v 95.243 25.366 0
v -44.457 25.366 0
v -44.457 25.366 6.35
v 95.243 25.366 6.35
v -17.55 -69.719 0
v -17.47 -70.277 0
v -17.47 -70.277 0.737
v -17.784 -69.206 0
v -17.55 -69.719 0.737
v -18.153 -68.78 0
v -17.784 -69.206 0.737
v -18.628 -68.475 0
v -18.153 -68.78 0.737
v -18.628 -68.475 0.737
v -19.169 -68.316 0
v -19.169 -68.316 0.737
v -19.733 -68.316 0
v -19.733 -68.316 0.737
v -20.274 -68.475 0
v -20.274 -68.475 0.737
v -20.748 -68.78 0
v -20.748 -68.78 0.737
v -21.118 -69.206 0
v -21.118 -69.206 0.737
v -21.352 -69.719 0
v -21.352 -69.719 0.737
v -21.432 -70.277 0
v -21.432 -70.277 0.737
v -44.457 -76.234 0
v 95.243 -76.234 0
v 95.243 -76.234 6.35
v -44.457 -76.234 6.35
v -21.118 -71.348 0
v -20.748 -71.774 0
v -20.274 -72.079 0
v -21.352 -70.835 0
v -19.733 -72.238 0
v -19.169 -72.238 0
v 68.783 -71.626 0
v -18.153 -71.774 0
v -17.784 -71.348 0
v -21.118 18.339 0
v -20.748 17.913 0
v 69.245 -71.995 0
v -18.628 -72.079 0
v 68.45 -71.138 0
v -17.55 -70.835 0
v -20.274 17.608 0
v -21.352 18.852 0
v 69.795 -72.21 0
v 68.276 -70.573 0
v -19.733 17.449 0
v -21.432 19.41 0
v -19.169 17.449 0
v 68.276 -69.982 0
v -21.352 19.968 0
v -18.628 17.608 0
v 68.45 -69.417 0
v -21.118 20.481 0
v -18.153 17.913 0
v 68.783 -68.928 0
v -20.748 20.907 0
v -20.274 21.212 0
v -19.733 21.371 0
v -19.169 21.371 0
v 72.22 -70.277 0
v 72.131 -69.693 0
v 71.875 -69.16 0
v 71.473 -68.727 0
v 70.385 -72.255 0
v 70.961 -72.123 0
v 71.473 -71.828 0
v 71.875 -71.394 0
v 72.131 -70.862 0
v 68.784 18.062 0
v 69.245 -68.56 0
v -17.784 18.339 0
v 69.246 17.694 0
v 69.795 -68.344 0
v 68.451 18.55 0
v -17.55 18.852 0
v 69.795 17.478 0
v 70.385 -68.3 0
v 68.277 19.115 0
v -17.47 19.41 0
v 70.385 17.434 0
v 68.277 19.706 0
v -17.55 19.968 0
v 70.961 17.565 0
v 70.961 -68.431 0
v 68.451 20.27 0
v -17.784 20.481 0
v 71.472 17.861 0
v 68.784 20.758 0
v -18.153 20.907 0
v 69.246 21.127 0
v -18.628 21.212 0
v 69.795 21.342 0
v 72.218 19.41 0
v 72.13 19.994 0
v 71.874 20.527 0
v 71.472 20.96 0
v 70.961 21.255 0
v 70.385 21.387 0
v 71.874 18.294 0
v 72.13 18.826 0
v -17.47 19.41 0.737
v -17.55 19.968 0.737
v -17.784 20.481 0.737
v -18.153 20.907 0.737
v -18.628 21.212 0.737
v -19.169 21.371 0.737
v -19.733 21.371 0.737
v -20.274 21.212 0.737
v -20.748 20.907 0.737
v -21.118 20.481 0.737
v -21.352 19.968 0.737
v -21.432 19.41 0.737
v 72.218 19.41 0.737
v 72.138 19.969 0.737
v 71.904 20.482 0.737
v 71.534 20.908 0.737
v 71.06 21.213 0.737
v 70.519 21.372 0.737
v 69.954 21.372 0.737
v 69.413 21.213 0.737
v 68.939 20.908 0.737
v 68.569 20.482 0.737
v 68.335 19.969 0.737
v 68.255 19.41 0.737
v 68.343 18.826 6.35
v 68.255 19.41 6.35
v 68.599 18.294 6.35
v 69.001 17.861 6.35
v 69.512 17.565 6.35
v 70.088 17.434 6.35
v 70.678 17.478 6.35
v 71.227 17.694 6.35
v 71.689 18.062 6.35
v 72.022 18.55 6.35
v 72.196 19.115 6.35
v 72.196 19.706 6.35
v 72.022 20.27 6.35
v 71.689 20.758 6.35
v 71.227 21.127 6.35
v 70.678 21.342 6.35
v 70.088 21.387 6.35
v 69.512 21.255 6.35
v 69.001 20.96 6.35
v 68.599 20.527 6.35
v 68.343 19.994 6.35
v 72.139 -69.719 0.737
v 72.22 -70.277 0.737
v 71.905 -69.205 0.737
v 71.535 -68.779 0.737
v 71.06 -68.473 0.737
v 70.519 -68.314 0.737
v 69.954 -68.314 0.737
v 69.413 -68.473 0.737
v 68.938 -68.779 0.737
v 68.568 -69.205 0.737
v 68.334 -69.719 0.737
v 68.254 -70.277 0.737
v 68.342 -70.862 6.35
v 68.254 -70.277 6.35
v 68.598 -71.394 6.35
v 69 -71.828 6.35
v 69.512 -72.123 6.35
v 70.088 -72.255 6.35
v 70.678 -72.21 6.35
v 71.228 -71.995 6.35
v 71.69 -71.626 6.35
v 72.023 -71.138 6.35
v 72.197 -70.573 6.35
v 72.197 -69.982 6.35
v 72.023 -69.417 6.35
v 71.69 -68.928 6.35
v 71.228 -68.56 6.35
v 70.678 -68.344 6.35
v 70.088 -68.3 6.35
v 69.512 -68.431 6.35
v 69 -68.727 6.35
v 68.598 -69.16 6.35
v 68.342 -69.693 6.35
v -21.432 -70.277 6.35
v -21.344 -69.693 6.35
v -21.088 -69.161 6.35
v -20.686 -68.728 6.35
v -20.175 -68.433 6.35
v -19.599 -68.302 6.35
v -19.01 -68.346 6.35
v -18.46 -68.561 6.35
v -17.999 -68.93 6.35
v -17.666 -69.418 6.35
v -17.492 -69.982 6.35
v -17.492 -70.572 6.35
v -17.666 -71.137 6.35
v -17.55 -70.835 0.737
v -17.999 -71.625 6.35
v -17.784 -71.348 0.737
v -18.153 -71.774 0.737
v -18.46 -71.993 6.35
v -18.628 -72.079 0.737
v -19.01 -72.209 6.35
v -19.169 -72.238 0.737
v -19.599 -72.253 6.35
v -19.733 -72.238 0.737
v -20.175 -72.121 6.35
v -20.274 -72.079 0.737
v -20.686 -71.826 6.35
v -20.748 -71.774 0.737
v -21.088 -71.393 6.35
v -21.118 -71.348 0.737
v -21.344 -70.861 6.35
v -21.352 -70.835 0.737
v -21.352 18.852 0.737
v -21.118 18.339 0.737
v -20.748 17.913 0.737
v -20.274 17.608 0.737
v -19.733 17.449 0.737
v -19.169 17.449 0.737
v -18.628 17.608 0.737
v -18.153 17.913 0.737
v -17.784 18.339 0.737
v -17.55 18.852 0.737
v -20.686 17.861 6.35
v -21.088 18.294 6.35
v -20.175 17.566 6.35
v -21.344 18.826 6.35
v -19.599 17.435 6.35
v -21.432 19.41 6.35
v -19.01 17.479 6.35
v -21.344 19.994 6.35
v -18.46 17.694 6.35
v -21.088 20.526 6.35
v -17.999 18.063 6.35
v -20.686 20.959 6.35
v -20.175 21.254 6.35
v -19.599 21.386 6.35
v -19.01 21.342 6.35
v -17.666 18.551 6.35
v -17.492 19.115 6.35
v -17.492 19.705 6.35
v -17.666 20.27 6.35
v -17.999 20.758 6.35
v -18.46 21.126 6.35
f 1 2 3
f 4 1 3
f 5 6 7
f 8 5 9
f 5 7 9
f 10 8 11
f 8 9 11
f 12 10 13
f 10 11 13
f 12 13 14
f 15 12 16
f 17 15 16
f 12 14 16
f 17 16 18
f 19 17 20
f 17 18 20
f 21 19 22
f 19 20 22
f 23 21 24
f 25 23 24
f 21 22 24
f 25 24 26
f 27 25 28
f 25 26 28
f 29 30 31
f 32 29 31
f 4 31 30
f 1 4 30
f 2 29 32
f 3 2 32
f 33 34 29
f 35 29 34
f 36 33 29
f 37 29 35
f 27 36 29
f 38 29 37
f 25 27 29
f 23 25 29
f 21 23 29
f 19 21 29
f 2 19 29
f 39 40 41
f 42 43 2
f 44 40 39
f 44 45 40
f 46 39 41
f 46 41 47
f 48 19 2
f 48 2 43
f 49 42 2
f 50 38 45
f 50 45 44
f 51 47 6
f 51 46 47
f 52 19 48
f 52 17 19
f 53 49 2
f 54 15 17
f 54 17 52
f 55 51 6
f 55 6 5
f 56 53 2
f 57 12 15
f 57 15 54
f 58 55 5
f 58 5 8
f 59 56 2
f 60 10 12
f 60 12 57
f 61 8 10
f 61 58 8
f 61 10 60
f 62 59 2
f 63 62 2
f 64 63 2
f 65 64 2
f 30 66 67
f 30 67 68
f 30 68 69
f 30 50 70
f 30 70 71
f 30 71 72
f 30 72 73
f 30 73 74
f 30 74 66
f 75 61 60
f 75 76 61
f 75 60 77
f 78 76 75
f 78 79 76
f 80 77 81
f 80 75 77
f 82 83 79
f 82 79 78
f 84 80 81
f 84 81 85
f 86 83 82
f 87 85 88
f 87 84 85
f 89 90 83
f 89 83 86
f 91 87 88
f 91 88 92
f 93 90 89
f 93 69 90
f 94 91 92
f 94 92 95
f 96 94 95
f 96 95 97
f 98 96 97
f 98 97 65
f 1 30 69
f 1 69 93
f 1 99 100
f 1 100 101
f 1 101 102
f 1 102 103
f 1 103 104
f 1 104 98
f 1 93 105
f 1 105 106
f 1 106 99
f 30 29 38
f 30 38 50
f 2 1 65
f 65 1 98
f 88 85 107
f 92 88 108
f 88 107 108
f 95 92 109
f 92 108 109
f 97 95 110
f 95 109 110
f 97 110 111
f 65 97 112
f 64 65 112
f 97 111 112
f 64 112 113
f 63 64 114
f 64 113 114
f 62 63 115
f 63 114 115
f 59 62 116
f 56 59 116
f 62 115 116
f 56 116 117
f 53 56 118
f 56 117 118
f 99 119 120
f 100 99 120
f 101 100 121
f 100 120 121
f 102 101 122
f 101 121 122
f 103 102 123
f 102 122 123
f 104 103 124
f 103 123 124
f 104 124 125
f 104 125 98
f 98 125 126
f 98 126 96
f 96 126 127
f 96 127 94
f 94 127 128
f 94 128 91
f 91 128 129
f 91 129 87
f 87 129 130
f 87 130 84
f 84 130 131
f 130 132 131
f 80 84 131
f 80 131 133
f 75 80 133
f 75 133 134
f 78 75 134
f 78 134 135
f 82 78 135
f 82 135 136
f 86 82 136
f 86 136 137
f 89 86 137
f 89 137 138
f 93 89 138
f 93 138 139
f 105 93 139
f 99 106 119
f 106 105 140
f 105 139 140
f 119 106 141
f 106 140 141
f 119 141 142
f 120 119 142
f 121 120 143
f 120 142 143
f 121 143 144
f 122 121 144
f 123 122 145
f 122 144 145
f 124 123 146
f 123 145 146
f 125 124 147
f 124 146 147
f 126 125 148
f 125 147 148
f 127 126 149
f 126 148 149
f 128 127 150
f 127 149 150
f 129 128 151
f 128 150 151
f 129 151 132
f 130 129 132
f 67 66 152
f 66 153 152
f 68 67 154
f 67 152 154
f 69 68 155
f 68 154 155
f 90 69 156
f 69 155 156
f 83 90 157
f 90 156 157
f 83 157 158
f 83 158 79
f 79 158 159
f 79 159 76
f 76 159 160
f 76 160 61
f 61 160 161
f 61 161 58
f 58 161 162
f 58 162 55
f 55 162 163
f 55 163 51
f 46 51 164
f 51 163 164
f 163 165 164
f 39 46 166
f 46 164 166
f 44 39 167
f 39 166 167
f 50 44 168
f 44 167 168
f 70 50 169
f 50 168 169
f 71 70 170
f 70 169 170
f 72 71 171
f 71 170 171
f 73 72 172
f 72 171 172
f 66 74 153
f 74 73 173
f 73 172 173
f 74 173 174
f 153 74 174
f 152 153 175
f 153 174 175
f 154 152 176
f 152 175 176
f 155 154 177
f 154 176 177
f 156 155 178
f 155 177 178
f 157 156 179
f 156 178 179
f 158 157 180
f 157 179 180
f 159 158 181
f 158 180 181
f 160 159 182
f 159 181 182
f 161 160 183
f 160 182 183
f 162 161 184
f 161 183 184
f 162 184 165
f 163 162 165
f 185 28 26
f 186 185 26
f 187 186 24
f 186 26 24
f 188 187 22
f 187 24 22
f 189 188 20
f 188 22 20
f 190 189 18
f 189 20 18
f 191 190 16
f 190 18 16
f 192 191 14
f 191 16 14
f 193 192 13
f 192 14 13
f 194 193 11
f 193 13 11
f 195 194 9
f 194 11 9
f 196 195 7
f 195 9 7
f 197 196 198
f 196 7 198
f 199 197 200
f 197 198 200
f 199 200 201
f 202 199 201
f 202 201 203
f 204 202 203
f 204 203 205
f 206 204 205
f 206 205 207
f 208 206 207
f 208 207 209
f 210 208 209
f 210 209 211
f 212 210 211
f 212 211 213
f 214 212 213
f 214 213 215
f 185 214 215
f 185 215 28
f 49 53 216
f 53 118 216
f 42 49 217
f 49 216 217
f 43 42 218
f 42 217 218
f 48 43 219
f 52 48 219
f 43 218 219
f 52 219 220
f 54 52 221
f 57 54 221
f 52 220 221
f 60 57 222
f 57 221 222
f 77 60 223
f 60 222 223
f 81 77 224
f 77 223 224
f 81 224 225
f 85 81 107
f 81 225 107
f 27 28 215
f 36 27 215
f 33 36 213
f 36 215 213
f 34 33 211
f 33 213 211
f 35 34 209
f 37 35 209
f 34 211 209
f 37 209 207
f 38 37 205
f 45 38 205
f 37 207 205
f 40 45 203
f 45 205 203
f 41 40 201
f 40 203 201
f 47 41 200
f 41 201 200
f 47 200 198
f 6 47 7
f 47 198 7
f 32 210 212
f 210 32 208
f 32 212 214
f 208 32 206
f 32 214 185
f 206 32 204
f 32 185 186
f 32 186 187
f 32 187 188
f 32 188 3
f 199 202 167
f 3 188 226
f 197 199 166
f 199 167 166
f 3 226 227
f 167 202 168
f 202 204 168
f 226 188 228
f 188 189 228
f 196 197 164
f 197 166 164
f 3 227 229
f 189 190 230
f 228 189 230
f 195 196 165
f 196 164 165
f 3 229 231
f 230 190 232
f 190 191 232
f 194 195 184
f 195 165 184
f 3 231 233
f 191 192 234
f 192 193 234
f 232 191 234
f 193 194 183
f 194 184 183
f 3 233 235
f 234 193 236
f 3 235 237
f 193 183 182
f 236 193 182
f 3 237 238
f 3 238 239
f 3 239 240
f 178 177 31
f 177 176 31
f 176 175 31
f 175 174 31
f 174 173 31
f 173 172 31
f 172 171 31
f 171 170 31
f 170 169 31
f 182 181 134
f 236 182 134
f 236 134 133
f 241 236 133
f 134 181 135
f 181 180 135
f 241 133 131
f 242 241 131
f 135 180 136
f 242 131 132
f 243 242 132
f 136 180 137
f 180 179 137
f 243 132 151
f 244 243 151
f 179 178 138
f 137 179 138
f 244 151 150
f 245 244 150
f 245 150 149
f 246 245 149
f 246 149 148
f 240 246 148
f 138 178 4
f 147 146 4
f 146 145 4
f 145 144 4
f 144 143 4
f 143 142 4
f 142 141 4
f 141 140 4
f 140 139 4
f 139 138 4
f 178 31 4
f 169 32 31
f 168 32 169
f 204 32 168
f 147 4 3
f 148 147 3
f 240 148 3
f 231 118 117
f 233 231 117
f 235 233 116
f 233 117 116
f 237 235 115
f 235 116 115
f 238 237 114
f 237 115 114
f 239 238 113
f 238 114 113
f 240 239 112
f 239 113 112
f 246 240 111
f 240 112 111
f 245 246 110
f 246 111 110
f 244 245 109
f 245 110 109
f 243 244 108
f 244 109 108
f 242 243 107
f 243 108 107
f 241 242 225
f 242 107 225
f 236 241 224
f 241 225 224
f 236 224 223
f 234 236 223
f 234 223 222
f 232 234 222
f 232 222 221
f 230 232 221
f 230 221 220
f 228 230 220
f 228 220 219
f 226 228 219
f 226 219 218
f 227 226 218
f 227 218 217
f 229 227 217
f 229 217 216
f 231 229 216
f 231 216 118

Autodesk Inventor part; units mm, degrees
ref_plane "YZ Plane" through (0, 0, 0) normal (1, 0, 0) x (0, 1, 0)
ref_plane "XZ Plane" through (0, 0, 0) normal (0, 1, 0) x (-1, 0, 0)
ref_plane "XY Plane" through (0, 0, 0) normal (0, 0, 1) x (1, 0, 0)
sketch "Sketch1" plane through (0, 0, 0) normal (0, 0, 1) x (1, 0, 0)
  line L0 (-25.4072, 25.3665) -> (76.1928, 25.3665)
  line L1 (76.1928, 25.3665) -> (76.1928, -76.2335)
  line L2 (76.1928, -76.2335) -> (-25.4072, -76.2335)
  line L3 (-25.4072, -76.2335) -> (-25.4072, 25.3665)
  point P0 (0, 0)
  dimension "d0" = 101.6
  dimension "d1" = 101.6
extrude "Extrusion1" add sketch "Sketch1" along normal blind 0.7366
sketch "Sketch2" plane through (0, 0, 0.7366) normal (0, 0, 1) x (1, 0, 0)
  line L0 (-25.4072, 25.3665) -> (76.1928, -76.2335)
  line L1 (76.1928, 25.3665) -> (-25.4072, -76.2335)
  circle A0 centre (25.3928, -25.4335) radius 27.432
  point P0 (0, 0)
  dimension "d4" = 54.864
extrude "Extrusion2" cut sketch "Sketch2" against normal blind 0.7366
sketch "Sketch3" plane through (0, 0, 0.7366) normal (0, 0, 1) x (1, 0, 0)
  line L0 (-25.4072, -76.2335) -> (-25.4072, 25.3665) projected
  line L1 (-25.4072, 25.3665) -> (-25.4072, -25.4335)
  line L2 (-25.4072, -25.4335) -> (-25.4072, 19.4102)
  line L3 (-25.4072, 25.3665) -> (76.1928, -76.2335)
  line L4 (76.1928, 25.3665) -> (-25.4072, -76.2335)
  circle A0 centre (-19.4509, 19.4102) radius 1.9812
  point P0 (0, 0)
  dimension "d7" = 44.8437
  dimension "d8" = 3.9624
extrude "Extrusion3" cut sketch "Sketch3" against normal blind 0.7366 contours A0 L3 | L3 A0
sketch "Sketch4" plane through (0, 0, 0.7366) normal (0, 0, 1) x (1, 0, 0)
  line L0 (-25.4072, -76.2335) -> (76.1928, 25.3665)
  line L1 (-25.4072, 25.3665) -> (76.1928, -76.2335)
  circle A0 centre (70.2365, 19.4102) radius 1.9819
  circle A1 centre (70.2365, -70.2772) radius 1.983
  circle A2 centre (-19.4509, -70.2772) radius 1.9812
  point P0 (0, 0)
extrude "Extrusion4" cut sketch "Sketch4" against normal blind 0.7366
sketch "Sketch5" plane through (0, 0, 0.7366) normal (0, 0, 1) x (1, 0, 0)
  circle A0 centre (25.3928, -25.4335) radius 27.432 projected
  circle A1 centre (25.3928, -25.4335) radius 29.972
  circle A2 centre (25.3928, -25.4335) radius 32.512
  point P0 (0, 0)
  dimension "d13" = 59.944
  dimension "d14" = 65.024
extrude "Extrusion5" add sketch "Sketch5" along normal blind 6.6548 contours A2
fillet "Fillet1" radius 3.175 4 edges at (-25.4072, 25.3665, 0.3683) (76.1928, 25.3665, 0.3683) (76.1928, -76.2335, 0.3683) (-25.4072, -76.2335, 0.3683)
sketch "Sketch6" plane through (0, 0, 0) normal (0, 0, -1) x (-1, 0, 0)
  circle A0 centre (-70.2365, 19.4102) radius 1.9819 projected
  circle A1 centre (19.4509, -70.2772) radius 1.9812 projected
  circle A2 centre (-70.2365, -70.2772) radius 1.983 projected
  circle A3 centre (19.4509, 19.4102) radius 1.9812 projected
  line L0 (-76.1928, 25.3665) -> (25.4072, 25.3665)
  line L1 (25.4072, 25.3665) -> (25.4072, -76.2335)
  line L2 (25.4072, -76.2335) -> (-76.1928, -76.2335)
  line L3 (-76.1928, -76.2335) -> (-76.1928, 25.3665)
  point P0 (0, 0)
extrude "Extrusion6" add sketch "Sketch6" against normal blind 6.35
sketch "Sketch7" plane through (0, 0, 6.35) normal (0, 0, 1) x (1, 0, 0)
  line L0 (-14.3145, 13.5707) -> (65.0173, 13.5707)
  line L1 (65.0173, 13.5707) -> (65.0173, -65.16)
  line L2 (65.0173, -65.16) -> (-14.3145, -65.16)
  line L3 (-14.3145, -65.16) -> (-14.3145, 13.5707)
  point P0 (0, 0)
extrude "Extrusion7" cut sketch "Sketch7" along normal blind 6.35
sketch "Sketch8" plane through (0, 0, 6.35) normal (0, 0, 1) x (1, 0, 0)
  circle A0 centre (70.2365, -70.2772) radius 1.983 projected
  circle A1 centre (-19.4509, 19.4102) radius 1.9812 projected
  line L0 (-19.4509, 19.4102) -> (70.2365, 19.4102)
  line L1 (70.2365, 19.4102) -> (70.2365, -70.2772)
  line L2 (70.2365, -70.2772) -> (-19.4509, -70.2772)
  line L3 (-19.4509, -70.2772) -> (-19.4509, 19.4102)
  line L4 (63.8865, 13.0602) -> (-13.1009, 13.0602)
  line L5 (-13.1009, 13.0602) -> (-13.1009, -63.9272)
  line L6 (-13.1009, -63.9272) -> (63.8865, -63.9272)
  line L7 (63.8865, -63.9272) -> (63.8865, 13.0602)
  line L8 (-13.1009, -25.4335) -> (-13.1009, -19.0835)
  line L9 (-13.1009, -19.0835) -> (63.8865, -19.0835)
  line L10 (63.8865, -19.0835) -> (63.8865, -31.7835)
  line L11 (63.8865, -31.7835) -> (-13.1009, -31.7835)
  point P0 (0, 0)
  dimension "d22" = 6.35
  dimension "d23" = 6.35
  dimension "d24" = 12.7
extrude "Extrusion8" cut sketch "Sketch8" against normal blind 25.4 contours L7 L9 L5 L4 | L7 L6 L5 L11
sketch "Sketch9" plane through (0, 0, 6.35) normal (0, 0, 1) x (1, 0, 0)
  line L0 (63.8865, -63.9272) -> (-13.1009, -63.9272) projected
  line L1 (-13.1009, 13.0602) -> (63.8865, 13.0602) projected
  line L2 (-25.4072, 25.3665) -> (76.1928, 25.3665) projected
  line L3 (76.1928, -76.2335) -> (-25.4072, -76.2335) projected
  line L4 (-13.1009, 13.0602) -> (-13.1009, 25.3665)
  line L5 (63.8865, 13.0602) -> (63.8865, 25.3665)
  line L6 (63.8865, -63.9272) -> (63.8865, -76.2335)
  line L7 (-13.1009, -63.9272) -> (-13.1009, -76.2335)
  point P0 (0, 0)
extrude "Extrusion9" cut sketch "Sketch9" against normal blind 25.4
sketch "Sketch10" plane through (0, 0, 6.35) normal (0, 0, 1) x (1, 0, 0)
  line L0 (63.8865, 25.3665) -> (63.8865, -19.0835) projected
  line L1 (63.8865, -19.0835) -> (-13.1009, -19.0835) projected
  line L2 (-13.1009, -19.0835) -> (-13.1009, 25.3665) projected
  line L3 (-13.1009, -76.2335) -> (-13.1009, -31.7835) projected
  line L4 (-13.1009, -31.7835) -> (63.8865, -31.7835) projected
  line L5 (63.8865, -31.7835) -> (63.8865, -76.2335) projected
  line L6 (63.8865, 25.3665) -> (76.1928, 25.3665) projected
  line L7 (-13.1009, 25.3665) -> (63.8865, 25.3665)
  line L8 (-13.1009, -76.2335) -> (63.8865, -76.2335)
  point P0 (0, 0)
extrude "Extrusion10" add sketch "Sketch10" against normal blind 6.35
sketch "Sketch11" plane through (76.1928, -76.2335, 0) normal (1, 0, 0) x (0, 0, -1)
  line L0 (0, 101.6) -> (0, 0) projected
  line L1 (0, 101.6) -> (-6.35, 101.6) projected
  line L2 (-6.35, 101.6) -> (-6.35, 0) projected
  line L3 (0, 0) -> (-6.35, 0) projected
  point P0 (0, 76.2335)
extrude "Extrusion11" add sketch "Sketch11" along normal blind 19.05
sketch "Sketch12" plane through (-25.4072, -76.2335, 0) normal (-1, 0, 0) x (0, 0, 1)
  line L0 (0, 0) -> (0, 101.6) projected
  line L1 (0, 0) -> (6.35, 0) projected
  line L2 (6.35, 0) -> (6.35, 101.6) projected
  line L3 (0, 101.6) -> (6.35, 101.6) projected
  point P0 (0, 76.2335)
extrude "Extrusion12" add sketch "Sketch12" along normal blind 19.05
properties part number "kinect base"
